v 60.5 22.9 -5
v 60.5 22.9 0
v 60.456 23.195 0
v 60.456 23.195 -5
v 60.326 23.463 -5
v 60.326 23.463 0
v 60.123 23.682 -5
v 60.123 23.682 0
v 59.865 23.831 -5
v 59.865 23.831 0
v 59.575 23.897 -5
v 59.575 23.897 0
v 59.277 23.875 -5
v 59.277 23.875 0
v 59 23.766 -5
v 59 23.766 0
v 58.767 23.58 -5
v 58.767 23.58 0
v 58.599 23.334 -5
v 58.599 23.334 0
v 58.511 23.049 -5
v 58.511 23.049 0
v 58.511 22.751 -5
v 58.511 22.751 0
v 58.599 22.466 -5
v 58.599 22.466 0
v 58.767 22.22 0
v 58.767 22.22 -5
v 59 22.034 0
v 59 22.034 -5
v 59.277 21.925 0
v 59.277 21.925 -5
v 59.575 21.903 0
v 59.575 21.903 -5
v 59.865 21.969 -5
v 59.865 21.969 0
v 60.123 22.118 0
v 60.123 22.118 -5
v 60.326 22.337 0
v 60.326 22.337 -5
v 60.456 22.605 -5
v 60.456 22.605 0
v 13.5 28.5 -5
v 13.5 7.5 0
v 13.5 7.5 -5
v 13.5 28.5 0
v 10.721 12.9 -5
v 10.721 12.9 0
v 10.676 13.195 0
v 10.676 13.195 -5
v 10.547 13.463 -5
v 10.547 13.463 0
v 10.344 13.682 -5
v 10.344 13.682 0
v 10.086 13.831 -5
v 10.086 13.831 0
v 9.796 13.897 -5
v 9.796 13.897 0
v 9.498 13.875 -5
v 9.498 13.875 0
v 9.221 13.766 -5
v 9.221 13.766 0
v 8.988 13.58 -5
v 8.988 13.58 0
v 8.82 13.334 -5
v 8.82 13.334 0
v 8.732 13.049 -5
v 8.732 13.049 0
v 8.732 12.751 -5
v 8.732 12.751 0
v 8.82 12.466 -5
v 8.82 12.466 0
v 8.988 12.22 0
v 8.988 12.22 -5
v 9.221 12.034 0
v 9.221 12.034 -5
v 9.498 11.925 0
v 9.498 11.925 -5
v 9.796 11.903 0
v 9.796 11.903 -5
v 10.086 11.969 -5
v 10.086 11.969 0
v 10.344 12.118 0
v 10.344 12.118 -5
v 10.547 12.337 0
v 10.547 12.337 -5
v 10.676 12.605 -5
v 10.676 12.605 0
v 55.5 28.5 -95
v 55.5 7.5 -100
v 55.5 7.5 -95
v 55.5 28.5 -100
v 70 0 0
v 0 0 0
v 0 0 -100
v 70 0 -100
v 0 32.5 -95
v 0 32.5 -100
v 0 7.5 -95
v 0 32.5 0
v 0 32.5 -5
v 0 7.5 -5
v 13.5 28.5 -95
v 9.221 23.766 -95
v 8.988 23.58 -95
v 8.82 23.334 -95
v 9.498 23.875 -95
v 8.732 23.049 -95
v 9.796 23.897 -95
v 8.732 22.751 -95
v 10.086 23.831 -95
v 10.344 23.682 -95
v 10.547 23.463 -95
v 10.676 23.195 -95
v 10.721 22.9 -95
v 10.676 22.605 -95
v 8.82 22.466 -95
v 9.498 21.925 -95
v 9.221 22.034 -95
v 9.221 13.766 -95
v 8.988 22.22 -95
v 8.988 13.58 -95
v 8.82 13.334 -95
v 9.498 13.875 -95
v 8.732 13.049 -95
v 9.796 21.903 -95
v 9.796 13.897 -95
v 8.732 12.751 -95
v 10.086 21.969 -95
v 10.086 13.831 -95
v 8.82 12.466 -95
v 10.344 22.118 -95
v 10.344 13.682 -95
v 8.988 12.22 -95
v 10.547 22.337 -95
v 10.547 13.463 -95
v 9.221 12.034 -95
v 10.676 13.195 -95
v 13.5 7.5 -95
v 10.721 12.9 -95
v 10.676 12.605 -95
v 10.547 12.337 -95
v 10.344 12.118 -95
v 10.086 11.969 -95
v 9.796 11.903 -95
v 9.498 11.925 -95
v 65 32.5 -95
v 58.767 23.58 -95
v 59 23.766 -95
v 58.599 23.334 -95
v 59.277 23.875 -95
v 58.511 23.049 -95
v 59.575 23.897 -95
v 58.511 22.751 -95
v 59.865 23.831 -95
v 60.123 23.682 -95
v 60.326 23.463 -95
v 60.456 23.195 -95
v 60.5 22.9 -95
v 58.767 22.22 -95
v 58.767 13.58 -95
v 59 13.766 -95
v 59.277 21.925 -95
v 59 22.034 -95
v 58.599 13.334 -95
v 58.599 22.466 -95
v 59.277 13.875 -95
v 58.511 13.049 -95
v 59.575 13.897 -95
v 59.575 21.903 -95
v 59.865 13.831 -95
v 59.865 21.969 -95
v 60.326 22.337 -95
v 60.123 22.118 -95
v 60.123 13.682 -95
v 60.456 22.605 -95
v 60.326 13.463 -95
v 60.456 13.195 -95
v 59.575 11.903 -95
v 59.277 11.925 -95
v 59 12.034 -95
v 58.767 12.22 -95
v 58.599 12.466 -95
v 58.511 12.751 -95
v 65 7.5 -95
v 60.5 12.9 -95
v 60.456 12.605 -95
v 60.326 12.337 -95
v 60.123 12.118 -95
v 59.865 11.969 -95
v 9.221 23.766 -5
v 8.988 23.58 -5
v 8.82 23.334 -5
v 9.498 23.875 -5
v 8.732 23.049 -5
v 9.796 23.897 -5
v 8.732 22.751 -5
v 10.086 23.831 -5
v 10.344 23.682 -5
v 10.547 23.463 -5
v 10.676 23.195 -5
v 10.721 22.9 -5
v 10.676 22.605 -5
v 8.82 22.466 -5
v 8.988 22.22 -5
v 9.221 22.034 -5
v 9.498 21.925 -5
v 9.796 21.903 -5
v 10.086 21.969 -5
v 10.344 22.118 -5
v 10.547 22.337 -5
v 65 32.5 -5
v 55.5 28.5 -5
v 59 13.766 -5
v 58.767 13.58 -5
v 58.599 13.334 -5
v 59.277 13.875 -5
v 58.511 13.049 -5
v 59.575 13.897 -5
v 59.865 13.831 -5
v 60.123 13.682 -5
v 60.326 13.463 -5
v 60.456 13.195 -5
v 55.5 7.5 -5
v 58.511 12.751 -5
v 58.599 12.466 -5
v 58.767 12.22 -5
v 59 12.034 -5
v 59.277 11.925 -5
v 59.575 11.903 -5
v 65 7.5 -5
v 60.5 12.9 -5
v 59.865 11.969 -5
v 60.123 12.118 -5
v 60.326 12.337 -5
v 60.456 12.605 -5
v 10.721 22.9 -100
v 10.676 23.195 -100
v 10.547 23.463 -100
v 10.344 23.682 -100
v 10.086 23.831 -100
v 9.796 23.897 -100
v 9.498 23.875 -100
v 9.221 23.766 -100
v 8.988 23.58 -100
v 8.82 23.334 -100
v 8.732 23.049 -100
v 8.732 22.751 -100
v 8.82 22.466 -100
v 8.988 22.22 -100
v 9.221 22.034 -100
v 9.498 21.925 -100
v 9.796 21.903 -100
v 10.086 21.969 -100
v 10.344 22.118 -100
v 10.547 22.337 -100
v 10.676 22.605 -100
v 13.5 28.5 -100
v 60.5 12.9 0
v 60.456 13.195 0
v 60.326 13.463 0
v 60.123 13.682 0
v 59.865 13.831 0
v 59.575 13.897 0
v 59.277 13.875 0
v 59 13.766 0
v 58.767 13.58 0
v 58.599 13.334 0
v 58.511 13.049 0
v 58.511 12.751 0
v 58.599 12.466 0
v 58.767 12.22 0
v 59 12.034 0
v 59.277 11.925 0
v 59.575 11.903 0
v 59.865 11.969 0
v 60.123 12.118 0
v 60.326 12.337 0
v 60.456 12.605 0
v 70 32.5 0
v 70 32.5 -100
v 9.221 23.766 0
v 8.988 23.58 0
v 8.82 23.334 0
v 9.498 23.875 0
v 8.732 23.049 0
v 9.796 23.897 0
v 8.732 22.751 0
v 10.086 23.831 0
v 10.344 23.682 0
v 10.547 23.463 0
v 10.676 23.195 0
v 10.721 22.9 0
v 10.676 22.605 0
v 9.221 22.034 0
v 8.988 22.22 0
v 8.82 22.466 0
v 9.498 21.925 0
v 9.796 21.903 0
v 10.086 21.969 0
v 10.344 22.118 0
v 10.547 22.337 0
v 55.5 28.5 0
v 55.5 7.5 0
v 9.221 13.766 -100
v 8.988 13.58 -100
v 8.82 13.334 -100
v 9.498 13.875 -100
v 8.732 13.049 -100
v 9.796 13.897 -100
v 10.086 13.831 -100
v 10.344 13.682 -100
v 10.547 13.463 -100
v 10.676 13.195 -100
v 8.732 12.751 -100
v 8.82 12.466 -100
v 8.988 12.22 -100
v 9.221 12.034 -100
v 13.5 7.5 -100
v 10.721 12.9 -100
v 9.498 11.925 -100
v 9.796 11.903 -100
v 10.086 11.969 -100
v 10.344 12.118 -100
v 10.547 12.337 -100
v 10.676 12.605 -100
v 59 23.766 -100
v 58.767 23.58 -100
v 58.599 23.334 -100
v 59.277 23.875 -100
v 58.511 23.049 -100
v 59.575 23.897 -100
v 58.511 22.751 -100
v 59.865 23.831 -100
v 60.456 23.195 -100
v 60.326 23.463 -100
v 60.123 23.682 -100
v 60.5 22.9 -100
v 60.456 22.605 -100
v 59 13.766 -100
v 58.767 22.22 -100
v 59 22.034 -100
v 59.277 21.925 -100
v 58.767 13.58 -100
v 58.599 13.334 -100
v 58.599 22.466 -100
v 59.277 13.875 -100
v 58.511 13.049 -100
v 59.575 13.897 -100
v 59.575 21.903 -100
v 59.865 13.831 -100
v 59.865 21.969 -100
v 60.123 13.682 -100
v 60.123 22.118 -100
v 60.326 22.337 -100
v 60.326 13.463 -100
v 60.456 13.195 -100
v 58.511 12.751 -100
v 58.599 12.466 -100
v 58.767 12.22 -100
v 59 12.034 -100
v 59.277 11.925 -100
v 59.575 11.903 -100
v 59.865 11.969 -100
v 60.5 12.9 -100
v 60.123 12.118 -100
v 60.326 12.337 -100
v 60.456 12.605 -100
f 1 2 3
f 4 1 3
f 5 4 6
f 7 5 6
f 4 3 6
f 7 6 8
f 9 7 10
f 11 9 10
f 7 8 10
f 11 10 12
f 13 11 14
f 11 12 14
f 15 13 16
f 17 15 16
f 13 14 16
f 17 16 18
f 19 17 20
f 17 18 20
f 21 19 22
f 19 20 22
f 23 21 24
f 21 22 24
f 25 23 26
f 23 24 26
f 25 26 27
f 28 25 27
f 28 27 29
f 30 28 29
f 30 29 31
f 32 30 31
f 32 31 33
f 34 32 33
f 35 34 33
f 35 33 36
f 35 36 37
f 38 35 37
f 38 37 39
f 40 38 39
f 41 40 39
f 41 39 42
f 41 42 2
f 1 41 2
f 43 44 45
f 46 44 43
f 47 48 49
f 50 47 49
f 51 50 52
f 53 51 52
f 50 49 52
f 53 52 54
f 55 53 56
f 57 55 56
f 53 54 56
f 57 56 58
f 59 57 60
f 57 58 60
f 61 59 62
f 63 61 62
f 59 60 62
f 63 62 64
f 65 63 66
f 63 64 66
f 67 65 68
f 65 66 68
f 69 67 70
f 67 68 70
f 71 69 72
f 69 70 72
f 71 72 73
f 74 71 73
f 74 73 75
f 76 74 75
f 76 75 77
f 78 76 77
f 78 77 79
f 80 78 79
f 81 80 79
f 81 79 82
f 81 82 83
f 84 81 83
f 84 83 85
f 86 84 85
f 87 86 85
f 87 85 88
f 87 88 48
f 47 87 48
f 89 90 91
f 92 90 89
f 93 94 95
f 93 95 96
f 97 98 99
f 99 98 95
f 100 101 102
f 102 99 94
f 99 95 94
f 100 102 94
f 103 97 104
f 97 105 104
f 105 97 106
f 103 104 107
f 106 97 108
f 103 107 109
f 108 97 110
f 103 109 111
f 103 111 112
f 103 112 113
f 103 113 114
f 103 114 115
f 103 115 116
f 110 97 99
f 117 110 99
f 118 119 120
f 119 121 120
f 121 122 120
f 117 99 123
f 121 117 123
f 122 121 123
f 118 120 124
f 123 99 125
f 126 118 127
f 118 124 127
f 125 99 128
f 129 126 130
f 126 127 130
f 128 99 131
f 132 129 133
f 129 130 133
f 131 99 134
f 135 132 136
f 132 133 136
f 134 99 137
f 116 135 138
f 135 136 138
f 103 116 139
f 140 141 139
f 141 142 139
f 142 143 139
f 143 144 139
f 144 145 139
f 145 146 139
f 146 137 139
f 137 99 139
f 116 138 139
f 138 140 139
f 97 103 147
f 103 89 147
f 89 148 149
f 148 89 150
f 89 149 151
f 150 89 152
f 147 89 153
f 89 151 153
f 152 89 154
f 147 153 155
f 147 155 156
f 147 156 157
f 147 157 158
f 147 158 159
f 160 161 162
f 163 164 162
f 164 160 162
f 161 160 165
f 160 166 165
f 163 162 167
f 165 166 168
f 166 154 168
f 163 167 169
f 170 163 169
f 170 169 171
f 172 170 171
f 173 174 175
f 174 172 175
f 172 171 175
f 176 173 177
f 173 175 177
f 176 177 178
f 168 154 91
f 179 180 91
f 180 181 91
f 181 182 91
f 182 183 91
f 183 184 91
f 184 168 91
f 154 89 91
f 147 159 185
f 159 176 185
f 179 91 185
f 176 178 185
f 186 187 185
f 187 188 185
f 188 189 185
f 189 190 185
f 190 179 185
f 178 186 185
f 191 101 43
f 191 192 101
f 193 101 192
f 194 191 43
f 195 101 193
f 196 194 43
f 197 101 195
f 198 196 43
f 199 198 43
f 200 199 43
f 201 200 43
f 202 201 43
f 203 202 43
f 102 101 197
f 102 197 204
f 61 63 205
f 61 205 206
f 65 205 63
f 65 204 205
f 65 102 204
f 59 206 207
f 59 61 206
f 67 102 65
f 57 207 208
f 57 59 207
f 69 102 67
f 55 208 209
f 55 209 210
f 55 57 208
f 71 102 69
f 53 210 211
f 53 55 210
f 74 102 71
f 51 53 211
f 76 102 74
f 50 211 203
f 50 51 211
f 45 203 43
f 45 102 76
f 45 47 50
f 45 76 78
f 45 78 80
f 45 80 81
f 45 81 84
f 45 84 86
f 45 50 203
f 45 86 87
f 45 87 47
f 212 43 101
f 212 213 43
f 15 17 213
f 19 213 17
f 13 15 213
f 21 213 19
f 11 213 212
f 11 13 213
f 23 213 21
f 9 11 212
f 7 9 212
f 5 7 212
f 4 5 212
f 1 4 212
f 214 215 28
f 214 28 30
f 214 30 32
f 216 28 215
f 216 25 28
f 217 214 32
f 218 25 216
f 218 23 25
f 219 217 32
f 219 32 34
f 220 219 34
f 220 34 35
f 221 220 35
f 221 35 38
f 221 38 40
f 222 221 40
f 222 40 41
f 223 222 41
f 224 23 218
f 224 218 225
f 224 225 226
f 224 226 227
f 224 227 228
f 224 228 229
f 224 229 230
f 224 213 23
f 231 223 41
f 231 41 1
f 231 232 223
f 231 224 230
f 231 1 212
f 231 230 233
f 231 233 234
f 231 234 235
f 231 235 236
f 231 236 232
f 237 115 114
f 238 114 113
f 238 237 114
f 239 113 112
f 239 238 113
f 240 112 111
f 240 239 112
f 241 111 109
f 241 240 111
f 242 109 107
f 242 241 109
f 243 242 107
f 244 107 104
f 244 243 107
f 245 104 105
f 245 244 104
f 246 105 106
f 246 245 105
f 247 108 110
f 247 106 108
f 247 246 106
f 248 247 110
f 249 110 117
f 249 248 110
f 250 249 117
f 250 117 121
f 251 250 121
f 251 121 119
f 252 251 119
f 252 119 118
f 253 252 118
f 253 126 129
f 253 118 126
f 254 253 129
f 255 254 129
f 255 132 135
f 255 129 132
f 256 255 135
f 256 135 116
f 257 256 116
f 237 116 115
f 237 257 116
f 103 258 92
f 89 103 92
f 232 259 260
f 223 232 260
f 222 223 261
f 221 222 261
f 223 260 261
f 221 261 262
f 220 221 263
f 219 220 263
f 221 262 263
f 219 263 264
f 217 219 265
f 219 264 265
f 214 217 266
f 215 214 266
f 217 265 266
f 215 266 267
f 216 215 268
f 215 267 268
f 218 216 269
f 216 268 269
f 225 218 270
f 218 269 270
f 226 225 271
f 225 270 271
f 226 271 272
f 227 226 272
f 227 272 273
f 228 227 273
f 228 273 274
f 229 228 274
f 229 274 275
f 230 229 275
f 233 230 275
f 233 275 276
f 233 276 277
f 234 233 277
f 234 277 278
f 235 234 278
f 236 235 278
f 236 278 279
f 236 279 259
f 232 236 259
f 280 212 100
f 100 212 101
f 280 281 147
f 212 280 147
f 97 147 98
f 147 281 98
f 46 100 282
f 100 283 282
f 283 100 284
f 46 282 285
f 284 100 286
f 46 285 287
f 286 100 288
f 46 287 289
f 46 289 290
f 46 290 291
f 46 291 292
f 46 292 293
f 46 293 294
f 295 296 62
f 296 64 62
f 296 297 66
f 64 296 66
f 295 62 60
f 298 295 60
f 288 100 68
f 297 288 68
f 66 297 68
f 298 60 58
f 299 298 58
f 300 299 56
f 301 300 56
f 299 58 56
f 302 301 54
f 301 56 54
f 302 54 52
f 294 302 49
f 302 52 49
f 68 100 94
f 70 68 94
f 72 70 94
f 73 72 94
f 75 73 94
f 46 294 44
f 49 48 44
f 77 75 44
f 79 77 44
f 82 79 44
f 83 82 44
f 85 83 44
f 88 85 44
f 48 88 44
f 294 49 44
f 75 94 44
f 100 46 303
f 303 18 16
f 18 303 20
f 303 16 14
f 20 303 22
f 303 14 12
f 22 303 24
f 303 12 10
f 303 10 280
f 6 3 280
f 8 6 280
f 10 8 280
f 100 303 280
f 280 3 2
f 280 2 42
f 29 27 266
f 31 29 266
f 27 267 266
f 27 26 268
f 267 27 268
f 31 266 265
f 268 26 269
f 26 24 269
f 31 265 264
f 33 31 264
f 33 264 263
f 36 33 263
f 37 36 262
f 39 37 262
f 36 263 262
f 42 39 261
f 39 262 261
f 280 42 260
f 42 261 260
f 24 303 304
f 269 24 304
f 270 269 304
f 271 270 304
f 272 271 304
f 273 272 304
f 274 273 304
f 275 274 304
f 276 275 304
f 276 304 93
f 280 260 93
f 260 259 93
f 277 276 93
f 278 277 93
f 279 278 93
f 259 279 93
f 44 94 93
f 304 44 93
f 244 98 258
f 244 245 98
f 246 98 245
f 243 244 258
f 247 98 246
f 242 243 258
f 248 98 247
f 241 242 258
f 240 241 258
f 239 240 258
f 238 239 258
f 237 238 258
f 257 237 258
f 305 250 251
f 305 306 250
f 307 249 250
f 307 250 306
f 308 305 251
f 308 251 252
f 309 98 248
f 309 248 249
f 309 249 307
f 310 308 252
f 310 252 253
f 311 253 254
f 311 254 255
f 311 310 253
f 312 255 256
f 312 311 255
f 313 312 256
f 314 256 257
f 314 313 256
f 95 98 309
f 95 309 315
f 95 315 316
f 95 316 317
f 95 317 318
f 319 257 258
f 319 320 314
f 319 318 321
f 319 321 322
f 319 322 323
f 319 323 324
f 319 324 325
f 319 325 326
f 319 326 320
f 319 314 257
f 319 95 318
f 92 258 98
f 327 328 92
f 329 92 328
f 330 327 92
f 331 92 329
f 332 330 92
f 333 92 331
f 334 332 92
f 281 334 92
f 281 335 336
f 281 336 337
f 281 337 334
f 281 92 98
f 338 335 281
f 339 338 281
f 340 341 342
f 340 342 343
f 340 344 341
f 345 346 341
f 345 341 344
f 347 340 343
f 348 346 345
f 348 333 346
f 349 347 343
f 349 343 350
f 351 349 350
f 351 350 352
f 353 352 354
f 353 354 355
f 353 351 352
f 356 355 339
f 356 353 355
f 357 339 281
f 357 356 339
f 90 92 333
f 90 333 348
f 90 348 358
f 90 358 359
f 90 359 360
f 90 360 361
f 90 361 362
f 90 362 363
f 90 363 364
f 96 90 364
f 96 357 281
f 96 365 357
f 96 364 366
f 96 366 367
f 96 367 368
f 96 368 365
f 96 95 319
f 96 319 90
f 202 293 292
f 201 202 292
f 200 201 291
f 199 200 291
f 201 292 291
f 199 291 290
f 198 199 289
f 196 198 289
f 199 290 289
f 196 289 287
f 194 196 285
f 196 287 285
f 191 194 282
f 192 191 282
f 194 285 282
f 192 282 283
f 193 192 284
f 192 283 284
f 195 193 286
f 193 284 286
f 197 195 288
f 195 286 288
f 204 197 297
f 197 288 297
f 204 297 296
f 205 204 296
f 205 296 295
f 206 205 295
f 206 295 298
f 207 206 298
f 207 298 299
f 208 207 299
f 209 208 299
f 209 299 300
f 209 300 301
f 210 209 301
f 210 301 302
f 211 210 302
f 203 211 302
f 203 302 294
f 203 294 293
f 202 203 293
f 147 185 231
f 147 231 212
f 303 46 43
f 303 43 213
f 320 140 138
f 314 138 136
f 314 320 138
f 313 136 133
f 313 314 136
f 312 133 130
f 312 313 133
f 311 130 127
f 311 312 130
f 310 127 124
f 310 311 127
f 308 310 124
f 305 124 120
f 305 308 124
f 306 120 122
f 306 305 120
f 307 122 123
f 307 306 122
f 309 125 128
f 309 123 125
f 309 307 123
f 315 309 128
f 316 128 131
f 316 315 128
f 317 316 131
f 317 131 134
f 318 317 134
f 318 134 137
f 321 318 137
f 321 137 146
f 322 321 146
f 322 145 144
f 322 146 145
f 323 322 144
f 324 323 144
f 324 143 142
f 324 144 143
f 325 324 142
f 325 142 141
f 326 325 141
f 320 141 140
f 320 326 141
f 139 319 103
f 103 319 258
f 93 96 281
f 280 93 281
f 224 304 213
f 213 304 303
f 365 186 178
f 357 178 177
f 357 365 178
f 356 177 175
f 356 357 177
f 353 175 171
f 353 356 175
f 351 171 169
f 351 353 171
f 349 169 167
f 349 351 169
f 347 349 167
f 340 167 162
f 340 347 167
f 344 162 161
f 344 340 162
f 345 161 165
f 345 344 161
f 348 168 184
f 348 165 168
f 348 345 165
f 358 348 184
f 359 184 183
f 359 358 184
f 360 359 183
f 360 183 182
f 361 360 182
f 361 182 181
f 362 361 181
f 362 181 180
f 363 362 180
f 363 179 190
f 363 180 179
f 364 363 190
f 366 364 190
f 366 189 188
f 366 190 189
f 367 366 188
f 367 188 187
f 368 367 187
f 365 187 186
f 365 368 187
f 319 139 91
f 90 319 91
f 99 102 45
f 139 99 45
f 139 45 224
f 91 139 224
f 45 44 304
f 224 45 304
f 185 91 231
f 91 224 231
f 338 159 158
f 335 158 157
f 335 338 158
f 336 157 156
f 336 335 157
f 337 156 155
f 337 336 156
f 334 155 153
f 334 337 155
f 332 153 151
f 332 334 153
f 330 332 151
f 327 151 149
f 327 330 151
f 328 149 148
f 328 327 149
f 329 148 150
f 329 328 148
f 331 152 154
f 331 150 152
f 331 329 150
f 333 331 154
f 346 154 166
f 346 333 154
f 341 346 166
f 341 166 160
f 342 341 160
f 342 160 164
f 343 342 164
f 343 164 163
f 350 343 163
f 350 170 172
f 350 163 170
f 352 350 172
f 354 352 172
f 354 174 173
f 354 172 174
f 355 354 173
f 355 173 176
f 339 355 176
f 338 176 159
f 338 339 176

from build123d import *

# Parameters (mm, degrees)
SKETCH1_W            = 70
SKETCH1_H            = 50
BOSS_EXTRUDE1_DEPTH  = 7.5
SKETCH2_W            = 70
SKETCH2_H            = 5
BOSS_EXTRUDE2_DEPTH  = 25
SKETCH3_R            = 1
SKETCH3_W            = 42
SKETCH3_H            = 21
CUT_EXTRUDE1_DEPTH   = 30
SKETCH27_W           = 5
SKETCH27_H           = 25
BOSS_EXTRUDE18_DEPTH = 45


with BuildPart() as part:
    # Sketch1 → Boss-Extrude1 (new body)
    with BuildSketch(Plane(origin=(0, 0, 0), x_dir=(1, 0, 0), z_dir=(0, 1, 0))):
        with Locations((35, 25)):
            Rectangle(SKETCH1_W, SKETCH1_H)
    boss_extrude1 = extrude(amount=BOSS_EXTRUDE1_DEPTH)

    # Sketch2 → Boss-Extrude2 (add)
    with BuildSketch(Plane(origin=(0, 7.5, 0), x_dir=(1, 0, 0), z_dir=(0, 1, 0))):
        with Locations((35, 2.5)):
            Rectangle(SKETCH2_W, SKETCH2_H)
    boss_extrude2 = extrude(amount=BOSS_EXTRUDE2_DEPTH)

    # Sketch3 → Cut-Extrude1 (cut)
    with BuildSketch(Plane.XY):
        with Locations((9.720773398, 22.9)):
            Circle(SKETCH3_R)
        with Locations((9.720773398, 12.9)):
            Circle(SKETCH3_R)
        with Locations((59.5, 12.9)):
            Circle(SKETCH3_R)
        with Locations((59.5, 22.9)):
            Circle(SKETCH3_R)
        with Locations((34.5, 18)):
            Rectangle(SKETCH3_W, SKETCH3_H)
    cut_extrude1 = extrude(amount=-CUT_EXTRUDE1_DEPTH, mode=Mode.SUBTRACT)

    # Sketch27 → Boss-Extrude18 (add)
    with BuildSketch(Plane(origin=(0, 0, -5), x_dir=(-1, 0, 0), z_dir=(0, 0, -1))):
        with Locations((-67.5, 20)):
            Rectangle(SKETCH27_W, SKETCH27_H)
    boss_extrude18 = extrude(amount=BOSS_EXTRUDE18_DEPTH)

    # Mirror1: Boss-Extrude1, Boss-Extrude2, Cut-Extrude1, Boss-Extrude18 across plane
    add(boss_extrude1.mirror(Plane(origin=(0, 0, -50), x_dir=(1, 0, 0), z_dir=(0, 0, -1))))
    add(boss_extrude2.mirror(Plane(origin=(0, 0, -50), x_dir=(1, 0, 0), z_dir=(0, 0, -1))))
    add(cut_extrude1.mirror(Plane(origin=(0, 0, -50), x_dir=(1, 0, 0), z_dir=(0, 0, -1))), mode=Mode.SUBTRACT)
    add(boss_extrude18.mirror(Plane(origin=(0, 0, -50), x_dir=(1, 0, 0), z_dir=(0, 0, -1))))


solid = part.part
